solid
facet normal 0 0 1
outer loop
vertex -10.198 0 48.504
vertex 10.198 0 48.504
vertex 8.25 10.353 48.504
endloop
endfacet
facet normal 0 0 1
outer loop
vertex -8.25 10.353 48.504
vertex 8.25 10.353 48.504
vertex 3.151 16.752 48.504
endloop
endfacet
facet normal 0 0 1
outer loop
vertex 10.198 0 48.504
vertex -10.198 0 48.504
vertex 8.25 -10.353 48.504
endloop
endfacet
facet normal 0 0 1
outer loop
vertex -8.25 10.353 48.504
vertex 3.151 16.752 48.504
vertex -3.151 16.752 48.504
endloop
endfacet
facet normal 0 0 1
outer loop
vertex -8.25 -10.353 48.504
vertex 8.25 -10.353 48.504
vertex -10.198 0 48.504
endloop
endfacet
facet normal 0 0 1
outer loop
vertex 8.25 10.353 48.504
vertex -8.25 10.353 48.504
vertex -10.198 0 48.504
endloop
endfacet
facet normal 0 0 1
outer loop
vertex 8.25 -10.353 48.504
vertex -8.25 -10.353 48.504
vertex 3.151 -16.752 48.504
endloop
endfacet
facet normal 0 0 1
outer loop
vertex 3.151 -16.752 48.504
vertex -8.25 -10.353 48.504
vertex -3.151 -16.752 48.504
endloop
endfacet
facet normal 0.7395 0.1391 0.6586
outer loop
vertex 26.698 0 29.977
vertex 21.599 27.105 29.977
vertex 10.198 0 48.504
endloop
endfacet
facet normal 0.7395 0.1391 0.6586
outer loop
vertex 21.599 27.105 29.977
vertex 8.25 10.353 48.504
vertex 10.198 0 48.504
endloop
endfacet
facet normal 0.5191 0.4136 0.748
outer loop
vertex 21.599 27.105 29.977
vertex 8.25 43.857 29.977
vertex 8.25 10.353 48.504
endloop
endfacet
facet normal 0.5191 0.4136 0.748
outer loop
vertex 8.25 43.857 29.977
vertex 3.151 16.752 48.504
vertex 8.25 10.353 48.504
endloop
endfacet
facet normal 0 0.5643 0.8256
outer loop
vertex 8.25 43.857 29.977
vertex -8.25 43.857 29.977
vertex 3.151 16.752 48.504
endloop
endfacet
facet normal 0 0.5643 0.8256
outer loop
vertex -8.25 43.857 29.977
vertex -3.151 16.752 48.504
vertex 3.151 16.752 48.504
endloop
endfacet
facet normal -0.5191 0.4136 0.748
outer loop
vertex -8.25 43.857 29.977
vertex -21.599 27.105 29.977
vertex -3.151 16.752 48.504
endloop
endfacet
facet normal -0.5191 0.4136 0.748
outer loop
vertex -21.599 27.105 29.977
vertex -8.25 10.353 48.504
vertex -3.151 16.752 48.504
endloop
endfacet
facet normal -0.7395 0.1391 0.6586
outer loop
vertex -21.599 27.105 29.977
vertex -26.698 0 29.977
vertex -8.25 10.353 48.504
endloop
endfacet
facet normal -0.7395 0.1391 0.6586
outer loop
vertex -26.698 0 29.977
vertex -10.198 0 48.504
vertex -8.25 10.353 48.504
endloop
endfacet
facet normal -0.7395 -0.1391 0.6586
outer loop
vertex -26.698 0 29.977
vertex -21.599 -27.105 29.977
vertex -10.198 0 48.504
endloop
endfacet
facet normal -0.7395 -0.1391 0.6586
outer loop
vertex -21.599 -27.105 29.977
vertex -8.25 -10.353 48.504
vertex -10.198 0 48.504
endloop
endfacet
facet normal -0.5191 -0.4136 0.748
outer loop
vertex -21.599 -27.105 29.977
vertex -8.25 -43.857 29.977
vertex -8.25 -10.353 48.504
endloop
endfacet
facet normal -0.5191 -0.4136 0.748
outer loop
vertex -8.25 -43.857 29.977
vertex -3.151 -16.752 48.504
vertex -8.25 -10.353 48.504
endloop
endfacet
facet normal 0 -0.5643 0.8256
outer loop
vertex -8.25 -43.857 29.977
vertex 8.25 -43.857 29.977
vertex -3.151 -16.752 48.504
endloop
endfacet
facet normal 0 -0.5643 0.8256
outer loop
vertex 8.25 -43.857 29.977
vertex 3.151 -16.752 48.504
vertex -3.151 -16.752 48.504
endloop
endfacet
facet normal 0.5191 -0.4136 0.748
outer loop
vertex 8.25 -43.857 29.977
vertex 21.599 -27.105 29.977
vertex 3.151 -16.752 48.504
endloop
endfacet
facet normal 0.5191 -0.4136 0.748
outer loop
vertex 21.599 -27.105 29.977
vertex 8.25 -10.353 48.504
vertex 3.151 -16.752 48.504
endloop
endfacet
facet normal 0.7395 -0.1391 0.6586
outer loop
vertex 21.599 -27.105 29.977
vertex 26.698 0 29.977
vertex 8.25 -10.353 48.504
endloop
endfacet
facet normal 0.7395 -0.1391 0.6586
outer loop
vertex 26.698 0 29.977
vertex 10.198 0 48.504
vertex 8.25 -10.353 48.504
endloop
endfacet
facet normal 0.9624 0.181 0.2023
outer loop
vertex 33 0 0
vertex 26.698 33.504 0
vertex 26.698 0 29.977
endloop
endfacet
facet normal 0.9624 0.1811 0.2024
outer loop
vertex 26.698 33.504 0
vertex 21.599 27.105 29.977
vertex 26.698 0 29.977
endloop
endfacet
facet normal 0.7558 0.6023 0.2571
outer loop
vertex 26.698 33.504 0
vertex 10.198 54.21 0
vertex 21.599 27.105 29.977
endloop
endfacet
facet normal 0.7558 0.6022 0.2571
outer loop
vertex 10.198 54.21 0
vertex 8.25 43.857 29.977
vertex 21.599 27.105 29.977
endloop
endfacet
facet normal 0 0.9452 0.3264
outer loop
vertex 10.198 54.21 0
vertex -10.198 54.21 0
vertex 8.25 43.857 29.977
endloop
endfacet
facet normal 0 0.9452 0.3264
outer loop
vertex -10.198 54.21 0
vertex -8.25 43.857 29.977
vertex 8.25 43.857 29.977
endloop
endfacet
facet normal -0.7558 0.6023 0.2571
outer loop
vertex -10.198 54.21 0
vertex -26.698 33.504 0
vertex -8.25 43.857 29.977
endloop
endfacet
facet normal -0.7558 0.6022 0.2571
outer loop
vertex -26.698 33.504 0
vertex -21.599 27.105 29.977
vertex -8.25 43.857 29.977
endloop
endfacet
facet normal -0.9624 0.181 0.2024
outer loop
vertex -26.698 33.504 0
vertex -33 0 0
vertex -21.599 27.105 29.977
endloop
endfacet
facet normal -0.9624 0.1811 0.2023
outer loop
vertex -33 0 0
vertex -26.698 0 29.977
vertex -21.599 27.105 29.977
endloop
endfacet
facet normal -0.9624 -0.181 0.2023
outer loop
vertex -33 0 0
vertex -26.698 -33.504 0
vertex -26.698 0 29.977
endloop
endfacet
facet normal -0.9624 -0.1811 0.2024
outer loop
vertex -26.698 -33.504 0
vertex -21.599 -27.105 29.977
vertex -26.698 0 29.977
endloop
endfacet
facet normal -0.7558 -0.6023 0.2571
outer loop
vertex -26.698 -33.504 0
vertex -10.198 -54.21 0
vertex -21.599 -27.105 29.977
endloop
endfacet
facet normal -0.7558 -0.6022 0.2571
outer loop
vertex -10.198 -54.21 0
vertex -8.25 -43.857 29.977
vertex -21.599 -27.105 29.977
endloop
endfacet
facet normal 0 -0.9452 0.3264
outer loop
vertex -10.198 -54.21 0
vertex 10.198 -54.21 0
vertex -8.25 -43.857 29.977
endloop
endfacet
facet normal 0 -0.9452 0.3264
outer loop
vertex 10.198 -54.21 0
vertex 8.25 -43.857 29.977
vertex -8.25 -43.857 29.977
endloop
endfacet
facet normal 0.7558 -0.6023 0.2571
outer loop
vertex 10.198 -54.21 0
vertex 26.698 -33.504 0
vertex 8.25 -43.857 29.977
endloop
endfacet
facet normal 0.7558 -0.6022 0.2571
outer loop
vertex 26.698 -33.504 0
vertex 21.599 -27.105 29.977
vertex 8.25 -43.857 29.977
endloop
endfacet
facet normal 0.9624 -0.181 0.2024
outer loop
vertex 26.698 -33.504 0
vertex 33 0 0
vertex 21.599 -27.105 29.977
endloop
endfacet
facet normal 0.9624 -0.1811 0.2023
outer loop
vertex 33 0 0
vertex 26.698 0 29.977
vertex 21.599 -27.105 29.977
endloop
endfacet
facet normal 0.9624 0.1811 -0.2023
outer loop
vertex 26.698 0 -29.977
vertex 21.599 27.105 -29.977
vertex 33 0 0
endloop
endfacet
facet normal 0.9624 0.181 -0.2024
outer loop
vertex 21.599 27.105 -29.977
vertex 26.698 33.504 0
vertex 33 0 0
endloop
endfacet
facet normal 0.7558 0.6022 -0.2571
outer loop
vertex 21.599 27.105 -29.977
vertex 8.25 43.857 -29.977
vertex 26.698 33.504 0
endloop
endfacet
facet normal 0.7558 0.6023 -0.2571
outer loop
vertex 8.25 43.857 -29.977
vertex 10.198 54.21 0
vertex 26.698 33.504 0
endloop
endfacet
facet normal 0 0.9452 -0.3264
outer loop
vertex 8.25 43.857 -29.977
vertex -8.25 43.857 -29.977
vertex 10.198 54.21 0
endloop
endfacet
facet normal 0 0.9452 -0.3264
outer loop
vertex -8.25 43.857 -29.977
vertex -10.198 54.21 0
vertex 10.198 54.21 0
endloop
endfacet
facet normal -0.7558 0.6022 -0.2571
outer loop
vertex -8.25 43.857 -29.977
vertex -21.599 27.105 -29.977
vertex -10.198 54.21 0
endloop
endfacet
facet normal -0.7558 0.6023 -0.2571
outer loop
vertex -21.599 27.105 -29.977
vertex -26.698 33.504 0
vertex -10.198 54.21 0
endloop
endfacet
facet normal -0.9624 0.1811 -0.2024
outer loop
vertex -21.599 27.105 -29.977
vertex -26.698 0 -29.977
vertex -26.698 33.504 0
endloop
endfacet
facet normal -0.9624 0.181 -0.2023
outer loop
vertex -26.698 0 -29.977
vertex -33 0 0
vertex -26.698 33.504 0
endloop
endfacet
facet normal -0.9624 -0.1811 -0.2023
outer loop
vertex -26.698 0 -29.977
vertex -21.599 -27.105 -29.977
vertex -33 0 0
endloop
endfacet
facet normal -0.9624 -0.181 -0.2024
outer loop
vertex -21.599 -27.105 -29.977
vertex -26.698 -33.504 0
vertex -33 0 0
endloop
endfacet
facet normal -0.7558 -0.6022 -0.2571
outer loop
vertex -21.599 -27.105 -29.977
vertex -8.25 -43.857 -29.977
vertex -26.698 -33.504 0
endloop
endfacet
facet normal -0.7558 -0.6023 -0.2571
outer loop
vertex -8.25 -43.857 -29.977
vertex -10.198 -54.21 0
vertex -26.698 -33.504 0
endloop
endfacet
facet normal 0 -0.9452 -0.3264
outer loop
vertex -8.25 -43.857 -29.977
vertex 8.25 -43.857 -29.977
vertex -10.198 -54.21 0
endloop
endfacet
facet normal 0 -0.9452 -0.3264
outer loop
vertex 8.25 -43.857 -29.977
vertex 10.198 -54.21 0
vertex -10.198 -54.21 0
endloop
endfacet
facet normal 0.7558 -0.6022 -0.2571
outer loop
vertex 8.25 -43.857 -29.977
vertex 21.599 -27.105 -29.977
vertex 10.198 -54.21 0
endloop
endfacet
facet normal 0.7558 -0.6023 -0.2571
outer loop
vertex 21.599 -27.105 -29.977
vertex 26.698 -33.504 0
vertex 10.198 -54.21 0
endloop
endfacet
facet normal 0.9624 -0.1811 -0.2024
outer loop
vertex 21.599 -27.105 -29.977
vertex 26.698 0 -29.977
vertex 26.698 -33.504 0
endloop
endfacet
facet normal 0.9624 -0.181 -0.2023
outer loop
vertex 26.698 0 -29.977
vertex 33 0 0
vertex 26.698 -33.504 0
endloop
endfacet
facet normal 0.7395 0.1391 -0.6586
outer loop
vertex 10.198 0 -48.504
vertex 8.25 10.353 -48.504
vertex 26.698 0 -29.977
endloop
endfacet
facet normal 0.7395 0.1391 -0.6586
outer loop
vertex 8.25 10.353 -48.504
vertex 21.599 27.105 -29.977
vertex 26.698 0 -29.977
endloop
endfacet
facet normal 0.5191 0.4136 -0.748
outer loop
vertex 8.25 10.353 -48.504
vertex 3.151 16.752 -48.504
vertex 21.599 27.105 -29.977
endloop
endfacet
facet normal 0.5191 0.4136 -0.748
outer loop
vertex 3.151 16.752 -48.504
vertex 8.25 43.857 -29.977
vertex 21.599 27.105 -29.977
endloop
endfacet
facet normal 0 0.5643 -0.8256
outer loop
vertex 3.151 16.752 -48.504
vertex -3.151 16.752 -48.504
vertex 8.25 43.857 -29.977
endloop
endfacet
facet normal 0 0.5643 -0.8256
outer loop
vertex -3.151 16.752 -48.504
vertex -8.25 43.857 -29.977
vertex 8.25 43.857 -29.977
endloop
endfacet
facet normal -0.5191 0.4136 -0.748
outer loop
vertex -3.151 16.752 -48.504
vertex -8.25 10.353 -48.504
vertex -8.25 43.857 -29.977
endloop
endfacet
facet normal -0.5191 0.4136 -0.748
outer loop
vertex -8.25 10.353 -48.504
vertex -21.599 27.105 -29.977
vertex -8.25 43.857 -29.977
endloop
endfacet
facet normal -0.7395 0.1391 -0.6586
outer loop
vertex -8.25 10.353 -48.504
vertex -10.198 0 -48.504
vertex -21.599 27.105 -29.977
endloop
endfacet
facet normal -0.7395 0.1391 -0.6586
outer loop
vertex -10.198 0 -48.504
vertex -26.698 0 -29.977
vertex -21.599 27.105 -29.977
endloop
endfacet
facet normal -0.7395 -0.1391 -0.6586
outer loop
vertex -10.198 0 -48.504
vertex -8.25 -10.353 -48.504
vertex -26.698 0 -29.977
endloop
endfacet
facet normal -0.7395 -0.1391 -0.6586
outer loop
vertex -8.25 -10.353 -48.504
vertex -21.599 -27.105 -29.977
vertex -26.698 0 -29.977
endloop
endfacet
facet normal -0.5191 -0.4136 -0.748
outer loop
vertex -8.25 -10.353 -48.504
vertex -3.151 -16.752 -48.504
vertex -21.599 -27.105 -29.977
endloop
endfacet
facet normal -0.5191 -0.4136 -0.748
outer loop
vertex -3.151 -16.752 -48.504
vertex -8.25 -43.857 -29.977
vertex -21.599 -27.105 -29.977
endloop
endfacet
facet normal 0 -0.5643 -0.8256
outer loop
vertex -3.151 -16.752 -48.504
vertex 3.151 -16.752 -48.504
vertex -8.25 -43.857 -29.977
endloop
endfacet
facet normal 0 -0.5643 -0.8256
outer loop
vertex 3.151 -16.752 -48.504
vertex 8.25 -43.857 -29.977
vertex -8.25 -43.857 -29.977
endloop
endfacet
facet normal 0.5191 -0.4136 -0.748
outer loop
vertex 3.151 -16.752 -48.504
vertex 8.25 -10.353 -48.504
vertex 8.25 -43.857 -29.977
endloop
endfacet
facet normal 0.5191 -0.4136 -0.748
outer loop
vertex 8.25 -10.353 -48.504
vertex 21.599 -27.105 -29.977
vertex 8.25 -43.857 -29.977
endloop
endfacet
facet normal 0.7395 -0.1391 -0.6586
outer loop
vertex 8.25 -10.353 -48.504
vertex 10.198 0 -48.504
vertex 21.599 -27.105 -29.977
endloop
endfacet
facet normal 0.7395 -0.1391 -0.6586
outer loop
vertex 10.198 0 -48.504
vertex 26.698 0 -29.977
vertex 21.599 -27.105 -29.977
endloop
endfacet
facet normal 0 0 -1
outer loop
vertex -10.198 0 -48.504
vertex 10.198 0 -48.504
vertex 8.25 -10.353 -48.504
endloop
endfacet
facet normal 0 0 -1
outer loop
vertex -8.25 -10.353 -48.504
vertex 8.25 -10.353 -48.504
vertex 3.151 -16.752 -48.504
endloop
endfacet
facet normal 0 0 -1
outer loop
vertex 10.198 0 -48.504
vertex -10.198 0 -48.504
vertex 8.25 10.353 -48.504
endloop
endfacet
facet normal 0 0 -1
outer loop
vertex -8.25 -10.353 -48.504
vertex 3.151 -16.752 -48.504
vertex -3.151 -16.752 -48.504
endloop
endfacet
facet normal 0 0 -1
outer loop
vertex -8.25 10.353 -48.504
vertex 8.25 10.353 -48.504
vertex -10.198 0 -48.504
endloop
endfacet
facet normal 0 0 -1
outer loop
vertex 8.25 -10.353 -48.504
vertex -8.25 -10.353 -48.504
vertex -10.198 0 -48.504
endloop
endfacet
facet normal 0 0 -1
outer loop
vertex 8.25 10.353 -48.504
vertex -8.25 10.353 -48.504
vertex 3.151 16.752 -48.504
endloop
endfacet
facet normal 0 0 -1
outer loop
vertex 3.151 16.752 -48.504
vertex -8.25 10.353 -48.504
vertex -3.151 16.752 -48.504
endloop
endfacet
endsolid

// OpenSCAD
// Generated by SolidPython 1.0.1 on 2020-07-29 00:46:50


scale(v = [11, 19, 17]) {
	sphere(r = 3);
}
/***********************************************
*********      SolidPython code:      **********
************************************************
 
# import packages: SolidPython
from solid import *
from solid.utils import *
from itertools import chain, combinations, permutations


class Resize:

    def __init__(self, scad_file):
        self.scad_file = scad_file
        #self.scad_file = import_scad(scad_file)
        # cone/cylinder param:
        self.r1 = 0
        self.r2 = 0
        self.h = 0
        # rectangular prism param:
        self.w = 0
        self.l = 0
        # ellipse param:
        self.r = 0

    # import OpenScad code (file name corresponds to shape)


    # classify shape + parameters
    def assign(self, param1, param2, param3):
        if self.scad_file == 'cone.scad':
            self.r1 = param1
            self.r2 = param2
            self.h = param3
        elif self.scad_file == 'cylinder.scad':
            self.r1 = param1
            self.r2 = param2
            self.h = param3
        elif self.scad_file == 'rectangularPrism.scad':
            self.h = param1
            self.l = param2
            self.w = param3
        else:
            self.r = param1
            self.h = param2

    # resize parameters
    def iterate(self):
        x = range(3, 20, 2)
        i = 1
        if self.scad_file == 'cone.scad':
            tempList = list(permutations(x, 2))
            for temp in tempList:
                param1 = temp[0]
                param2 = temp[1]
                filepath = 'produced_scad_files/' + 'cone' + str(param1) + '_' + str(param2) + '_' + '.scad'
                scad_render_to_file(cylinder(h=param1, r1=param2, r2=0), filepath)

        elif self.scad_file == 'cylinder.scad':
            tempList = list(permutations(x, 3))
            for temp in tempList:
                param1 = temp[0]
                param2 = temp[1]
                filepath = 'produced_scad_files/' + 'cylinder' + str(param1) + '_' + str(param2) + '_' + '.scad'
                scad_render_to_file(cylinder(h=param1, r1=param2, r2=param2), filepath)

        elif self.scad_file == 'rectangularPrism.scad':
            tempList = list(permutations(x, 3))
            for temp in tempList:
                param1 = temp[0]
                param2 = temp[1]
                param3 = temp[2]
                filepath = 'produced_scad_files/' + 'rectangularPrism' + str(param1) + '_' + str(param2) + '_' + str(
                    param3) + '.scad'
                scad_render_to_file(cube(size=(param1, param2, param3)), filepath)

        elif self.scad_file == 'ellipse.scad':
            tempList = list(permutations(x, 4))
            for temp in tempList:
                param1 = temp[0]
                param2 = temp[1]
                param3 = temp[2]
                param4 = temp[3]
                filepath = 'produced_scad_files/' + 'ellipse' + str(param1) + '_' + str(param2) + '_' + str(param3) + '_' + str(param4) + '.scad'
                scad_render_to_file(scale([param1, param2, param3])(sphere(r=param4)), filepath)

    def render_to_scadfile(self):
        scad_render_to_file(scad, 'example.scad') 
 
************************************************/
